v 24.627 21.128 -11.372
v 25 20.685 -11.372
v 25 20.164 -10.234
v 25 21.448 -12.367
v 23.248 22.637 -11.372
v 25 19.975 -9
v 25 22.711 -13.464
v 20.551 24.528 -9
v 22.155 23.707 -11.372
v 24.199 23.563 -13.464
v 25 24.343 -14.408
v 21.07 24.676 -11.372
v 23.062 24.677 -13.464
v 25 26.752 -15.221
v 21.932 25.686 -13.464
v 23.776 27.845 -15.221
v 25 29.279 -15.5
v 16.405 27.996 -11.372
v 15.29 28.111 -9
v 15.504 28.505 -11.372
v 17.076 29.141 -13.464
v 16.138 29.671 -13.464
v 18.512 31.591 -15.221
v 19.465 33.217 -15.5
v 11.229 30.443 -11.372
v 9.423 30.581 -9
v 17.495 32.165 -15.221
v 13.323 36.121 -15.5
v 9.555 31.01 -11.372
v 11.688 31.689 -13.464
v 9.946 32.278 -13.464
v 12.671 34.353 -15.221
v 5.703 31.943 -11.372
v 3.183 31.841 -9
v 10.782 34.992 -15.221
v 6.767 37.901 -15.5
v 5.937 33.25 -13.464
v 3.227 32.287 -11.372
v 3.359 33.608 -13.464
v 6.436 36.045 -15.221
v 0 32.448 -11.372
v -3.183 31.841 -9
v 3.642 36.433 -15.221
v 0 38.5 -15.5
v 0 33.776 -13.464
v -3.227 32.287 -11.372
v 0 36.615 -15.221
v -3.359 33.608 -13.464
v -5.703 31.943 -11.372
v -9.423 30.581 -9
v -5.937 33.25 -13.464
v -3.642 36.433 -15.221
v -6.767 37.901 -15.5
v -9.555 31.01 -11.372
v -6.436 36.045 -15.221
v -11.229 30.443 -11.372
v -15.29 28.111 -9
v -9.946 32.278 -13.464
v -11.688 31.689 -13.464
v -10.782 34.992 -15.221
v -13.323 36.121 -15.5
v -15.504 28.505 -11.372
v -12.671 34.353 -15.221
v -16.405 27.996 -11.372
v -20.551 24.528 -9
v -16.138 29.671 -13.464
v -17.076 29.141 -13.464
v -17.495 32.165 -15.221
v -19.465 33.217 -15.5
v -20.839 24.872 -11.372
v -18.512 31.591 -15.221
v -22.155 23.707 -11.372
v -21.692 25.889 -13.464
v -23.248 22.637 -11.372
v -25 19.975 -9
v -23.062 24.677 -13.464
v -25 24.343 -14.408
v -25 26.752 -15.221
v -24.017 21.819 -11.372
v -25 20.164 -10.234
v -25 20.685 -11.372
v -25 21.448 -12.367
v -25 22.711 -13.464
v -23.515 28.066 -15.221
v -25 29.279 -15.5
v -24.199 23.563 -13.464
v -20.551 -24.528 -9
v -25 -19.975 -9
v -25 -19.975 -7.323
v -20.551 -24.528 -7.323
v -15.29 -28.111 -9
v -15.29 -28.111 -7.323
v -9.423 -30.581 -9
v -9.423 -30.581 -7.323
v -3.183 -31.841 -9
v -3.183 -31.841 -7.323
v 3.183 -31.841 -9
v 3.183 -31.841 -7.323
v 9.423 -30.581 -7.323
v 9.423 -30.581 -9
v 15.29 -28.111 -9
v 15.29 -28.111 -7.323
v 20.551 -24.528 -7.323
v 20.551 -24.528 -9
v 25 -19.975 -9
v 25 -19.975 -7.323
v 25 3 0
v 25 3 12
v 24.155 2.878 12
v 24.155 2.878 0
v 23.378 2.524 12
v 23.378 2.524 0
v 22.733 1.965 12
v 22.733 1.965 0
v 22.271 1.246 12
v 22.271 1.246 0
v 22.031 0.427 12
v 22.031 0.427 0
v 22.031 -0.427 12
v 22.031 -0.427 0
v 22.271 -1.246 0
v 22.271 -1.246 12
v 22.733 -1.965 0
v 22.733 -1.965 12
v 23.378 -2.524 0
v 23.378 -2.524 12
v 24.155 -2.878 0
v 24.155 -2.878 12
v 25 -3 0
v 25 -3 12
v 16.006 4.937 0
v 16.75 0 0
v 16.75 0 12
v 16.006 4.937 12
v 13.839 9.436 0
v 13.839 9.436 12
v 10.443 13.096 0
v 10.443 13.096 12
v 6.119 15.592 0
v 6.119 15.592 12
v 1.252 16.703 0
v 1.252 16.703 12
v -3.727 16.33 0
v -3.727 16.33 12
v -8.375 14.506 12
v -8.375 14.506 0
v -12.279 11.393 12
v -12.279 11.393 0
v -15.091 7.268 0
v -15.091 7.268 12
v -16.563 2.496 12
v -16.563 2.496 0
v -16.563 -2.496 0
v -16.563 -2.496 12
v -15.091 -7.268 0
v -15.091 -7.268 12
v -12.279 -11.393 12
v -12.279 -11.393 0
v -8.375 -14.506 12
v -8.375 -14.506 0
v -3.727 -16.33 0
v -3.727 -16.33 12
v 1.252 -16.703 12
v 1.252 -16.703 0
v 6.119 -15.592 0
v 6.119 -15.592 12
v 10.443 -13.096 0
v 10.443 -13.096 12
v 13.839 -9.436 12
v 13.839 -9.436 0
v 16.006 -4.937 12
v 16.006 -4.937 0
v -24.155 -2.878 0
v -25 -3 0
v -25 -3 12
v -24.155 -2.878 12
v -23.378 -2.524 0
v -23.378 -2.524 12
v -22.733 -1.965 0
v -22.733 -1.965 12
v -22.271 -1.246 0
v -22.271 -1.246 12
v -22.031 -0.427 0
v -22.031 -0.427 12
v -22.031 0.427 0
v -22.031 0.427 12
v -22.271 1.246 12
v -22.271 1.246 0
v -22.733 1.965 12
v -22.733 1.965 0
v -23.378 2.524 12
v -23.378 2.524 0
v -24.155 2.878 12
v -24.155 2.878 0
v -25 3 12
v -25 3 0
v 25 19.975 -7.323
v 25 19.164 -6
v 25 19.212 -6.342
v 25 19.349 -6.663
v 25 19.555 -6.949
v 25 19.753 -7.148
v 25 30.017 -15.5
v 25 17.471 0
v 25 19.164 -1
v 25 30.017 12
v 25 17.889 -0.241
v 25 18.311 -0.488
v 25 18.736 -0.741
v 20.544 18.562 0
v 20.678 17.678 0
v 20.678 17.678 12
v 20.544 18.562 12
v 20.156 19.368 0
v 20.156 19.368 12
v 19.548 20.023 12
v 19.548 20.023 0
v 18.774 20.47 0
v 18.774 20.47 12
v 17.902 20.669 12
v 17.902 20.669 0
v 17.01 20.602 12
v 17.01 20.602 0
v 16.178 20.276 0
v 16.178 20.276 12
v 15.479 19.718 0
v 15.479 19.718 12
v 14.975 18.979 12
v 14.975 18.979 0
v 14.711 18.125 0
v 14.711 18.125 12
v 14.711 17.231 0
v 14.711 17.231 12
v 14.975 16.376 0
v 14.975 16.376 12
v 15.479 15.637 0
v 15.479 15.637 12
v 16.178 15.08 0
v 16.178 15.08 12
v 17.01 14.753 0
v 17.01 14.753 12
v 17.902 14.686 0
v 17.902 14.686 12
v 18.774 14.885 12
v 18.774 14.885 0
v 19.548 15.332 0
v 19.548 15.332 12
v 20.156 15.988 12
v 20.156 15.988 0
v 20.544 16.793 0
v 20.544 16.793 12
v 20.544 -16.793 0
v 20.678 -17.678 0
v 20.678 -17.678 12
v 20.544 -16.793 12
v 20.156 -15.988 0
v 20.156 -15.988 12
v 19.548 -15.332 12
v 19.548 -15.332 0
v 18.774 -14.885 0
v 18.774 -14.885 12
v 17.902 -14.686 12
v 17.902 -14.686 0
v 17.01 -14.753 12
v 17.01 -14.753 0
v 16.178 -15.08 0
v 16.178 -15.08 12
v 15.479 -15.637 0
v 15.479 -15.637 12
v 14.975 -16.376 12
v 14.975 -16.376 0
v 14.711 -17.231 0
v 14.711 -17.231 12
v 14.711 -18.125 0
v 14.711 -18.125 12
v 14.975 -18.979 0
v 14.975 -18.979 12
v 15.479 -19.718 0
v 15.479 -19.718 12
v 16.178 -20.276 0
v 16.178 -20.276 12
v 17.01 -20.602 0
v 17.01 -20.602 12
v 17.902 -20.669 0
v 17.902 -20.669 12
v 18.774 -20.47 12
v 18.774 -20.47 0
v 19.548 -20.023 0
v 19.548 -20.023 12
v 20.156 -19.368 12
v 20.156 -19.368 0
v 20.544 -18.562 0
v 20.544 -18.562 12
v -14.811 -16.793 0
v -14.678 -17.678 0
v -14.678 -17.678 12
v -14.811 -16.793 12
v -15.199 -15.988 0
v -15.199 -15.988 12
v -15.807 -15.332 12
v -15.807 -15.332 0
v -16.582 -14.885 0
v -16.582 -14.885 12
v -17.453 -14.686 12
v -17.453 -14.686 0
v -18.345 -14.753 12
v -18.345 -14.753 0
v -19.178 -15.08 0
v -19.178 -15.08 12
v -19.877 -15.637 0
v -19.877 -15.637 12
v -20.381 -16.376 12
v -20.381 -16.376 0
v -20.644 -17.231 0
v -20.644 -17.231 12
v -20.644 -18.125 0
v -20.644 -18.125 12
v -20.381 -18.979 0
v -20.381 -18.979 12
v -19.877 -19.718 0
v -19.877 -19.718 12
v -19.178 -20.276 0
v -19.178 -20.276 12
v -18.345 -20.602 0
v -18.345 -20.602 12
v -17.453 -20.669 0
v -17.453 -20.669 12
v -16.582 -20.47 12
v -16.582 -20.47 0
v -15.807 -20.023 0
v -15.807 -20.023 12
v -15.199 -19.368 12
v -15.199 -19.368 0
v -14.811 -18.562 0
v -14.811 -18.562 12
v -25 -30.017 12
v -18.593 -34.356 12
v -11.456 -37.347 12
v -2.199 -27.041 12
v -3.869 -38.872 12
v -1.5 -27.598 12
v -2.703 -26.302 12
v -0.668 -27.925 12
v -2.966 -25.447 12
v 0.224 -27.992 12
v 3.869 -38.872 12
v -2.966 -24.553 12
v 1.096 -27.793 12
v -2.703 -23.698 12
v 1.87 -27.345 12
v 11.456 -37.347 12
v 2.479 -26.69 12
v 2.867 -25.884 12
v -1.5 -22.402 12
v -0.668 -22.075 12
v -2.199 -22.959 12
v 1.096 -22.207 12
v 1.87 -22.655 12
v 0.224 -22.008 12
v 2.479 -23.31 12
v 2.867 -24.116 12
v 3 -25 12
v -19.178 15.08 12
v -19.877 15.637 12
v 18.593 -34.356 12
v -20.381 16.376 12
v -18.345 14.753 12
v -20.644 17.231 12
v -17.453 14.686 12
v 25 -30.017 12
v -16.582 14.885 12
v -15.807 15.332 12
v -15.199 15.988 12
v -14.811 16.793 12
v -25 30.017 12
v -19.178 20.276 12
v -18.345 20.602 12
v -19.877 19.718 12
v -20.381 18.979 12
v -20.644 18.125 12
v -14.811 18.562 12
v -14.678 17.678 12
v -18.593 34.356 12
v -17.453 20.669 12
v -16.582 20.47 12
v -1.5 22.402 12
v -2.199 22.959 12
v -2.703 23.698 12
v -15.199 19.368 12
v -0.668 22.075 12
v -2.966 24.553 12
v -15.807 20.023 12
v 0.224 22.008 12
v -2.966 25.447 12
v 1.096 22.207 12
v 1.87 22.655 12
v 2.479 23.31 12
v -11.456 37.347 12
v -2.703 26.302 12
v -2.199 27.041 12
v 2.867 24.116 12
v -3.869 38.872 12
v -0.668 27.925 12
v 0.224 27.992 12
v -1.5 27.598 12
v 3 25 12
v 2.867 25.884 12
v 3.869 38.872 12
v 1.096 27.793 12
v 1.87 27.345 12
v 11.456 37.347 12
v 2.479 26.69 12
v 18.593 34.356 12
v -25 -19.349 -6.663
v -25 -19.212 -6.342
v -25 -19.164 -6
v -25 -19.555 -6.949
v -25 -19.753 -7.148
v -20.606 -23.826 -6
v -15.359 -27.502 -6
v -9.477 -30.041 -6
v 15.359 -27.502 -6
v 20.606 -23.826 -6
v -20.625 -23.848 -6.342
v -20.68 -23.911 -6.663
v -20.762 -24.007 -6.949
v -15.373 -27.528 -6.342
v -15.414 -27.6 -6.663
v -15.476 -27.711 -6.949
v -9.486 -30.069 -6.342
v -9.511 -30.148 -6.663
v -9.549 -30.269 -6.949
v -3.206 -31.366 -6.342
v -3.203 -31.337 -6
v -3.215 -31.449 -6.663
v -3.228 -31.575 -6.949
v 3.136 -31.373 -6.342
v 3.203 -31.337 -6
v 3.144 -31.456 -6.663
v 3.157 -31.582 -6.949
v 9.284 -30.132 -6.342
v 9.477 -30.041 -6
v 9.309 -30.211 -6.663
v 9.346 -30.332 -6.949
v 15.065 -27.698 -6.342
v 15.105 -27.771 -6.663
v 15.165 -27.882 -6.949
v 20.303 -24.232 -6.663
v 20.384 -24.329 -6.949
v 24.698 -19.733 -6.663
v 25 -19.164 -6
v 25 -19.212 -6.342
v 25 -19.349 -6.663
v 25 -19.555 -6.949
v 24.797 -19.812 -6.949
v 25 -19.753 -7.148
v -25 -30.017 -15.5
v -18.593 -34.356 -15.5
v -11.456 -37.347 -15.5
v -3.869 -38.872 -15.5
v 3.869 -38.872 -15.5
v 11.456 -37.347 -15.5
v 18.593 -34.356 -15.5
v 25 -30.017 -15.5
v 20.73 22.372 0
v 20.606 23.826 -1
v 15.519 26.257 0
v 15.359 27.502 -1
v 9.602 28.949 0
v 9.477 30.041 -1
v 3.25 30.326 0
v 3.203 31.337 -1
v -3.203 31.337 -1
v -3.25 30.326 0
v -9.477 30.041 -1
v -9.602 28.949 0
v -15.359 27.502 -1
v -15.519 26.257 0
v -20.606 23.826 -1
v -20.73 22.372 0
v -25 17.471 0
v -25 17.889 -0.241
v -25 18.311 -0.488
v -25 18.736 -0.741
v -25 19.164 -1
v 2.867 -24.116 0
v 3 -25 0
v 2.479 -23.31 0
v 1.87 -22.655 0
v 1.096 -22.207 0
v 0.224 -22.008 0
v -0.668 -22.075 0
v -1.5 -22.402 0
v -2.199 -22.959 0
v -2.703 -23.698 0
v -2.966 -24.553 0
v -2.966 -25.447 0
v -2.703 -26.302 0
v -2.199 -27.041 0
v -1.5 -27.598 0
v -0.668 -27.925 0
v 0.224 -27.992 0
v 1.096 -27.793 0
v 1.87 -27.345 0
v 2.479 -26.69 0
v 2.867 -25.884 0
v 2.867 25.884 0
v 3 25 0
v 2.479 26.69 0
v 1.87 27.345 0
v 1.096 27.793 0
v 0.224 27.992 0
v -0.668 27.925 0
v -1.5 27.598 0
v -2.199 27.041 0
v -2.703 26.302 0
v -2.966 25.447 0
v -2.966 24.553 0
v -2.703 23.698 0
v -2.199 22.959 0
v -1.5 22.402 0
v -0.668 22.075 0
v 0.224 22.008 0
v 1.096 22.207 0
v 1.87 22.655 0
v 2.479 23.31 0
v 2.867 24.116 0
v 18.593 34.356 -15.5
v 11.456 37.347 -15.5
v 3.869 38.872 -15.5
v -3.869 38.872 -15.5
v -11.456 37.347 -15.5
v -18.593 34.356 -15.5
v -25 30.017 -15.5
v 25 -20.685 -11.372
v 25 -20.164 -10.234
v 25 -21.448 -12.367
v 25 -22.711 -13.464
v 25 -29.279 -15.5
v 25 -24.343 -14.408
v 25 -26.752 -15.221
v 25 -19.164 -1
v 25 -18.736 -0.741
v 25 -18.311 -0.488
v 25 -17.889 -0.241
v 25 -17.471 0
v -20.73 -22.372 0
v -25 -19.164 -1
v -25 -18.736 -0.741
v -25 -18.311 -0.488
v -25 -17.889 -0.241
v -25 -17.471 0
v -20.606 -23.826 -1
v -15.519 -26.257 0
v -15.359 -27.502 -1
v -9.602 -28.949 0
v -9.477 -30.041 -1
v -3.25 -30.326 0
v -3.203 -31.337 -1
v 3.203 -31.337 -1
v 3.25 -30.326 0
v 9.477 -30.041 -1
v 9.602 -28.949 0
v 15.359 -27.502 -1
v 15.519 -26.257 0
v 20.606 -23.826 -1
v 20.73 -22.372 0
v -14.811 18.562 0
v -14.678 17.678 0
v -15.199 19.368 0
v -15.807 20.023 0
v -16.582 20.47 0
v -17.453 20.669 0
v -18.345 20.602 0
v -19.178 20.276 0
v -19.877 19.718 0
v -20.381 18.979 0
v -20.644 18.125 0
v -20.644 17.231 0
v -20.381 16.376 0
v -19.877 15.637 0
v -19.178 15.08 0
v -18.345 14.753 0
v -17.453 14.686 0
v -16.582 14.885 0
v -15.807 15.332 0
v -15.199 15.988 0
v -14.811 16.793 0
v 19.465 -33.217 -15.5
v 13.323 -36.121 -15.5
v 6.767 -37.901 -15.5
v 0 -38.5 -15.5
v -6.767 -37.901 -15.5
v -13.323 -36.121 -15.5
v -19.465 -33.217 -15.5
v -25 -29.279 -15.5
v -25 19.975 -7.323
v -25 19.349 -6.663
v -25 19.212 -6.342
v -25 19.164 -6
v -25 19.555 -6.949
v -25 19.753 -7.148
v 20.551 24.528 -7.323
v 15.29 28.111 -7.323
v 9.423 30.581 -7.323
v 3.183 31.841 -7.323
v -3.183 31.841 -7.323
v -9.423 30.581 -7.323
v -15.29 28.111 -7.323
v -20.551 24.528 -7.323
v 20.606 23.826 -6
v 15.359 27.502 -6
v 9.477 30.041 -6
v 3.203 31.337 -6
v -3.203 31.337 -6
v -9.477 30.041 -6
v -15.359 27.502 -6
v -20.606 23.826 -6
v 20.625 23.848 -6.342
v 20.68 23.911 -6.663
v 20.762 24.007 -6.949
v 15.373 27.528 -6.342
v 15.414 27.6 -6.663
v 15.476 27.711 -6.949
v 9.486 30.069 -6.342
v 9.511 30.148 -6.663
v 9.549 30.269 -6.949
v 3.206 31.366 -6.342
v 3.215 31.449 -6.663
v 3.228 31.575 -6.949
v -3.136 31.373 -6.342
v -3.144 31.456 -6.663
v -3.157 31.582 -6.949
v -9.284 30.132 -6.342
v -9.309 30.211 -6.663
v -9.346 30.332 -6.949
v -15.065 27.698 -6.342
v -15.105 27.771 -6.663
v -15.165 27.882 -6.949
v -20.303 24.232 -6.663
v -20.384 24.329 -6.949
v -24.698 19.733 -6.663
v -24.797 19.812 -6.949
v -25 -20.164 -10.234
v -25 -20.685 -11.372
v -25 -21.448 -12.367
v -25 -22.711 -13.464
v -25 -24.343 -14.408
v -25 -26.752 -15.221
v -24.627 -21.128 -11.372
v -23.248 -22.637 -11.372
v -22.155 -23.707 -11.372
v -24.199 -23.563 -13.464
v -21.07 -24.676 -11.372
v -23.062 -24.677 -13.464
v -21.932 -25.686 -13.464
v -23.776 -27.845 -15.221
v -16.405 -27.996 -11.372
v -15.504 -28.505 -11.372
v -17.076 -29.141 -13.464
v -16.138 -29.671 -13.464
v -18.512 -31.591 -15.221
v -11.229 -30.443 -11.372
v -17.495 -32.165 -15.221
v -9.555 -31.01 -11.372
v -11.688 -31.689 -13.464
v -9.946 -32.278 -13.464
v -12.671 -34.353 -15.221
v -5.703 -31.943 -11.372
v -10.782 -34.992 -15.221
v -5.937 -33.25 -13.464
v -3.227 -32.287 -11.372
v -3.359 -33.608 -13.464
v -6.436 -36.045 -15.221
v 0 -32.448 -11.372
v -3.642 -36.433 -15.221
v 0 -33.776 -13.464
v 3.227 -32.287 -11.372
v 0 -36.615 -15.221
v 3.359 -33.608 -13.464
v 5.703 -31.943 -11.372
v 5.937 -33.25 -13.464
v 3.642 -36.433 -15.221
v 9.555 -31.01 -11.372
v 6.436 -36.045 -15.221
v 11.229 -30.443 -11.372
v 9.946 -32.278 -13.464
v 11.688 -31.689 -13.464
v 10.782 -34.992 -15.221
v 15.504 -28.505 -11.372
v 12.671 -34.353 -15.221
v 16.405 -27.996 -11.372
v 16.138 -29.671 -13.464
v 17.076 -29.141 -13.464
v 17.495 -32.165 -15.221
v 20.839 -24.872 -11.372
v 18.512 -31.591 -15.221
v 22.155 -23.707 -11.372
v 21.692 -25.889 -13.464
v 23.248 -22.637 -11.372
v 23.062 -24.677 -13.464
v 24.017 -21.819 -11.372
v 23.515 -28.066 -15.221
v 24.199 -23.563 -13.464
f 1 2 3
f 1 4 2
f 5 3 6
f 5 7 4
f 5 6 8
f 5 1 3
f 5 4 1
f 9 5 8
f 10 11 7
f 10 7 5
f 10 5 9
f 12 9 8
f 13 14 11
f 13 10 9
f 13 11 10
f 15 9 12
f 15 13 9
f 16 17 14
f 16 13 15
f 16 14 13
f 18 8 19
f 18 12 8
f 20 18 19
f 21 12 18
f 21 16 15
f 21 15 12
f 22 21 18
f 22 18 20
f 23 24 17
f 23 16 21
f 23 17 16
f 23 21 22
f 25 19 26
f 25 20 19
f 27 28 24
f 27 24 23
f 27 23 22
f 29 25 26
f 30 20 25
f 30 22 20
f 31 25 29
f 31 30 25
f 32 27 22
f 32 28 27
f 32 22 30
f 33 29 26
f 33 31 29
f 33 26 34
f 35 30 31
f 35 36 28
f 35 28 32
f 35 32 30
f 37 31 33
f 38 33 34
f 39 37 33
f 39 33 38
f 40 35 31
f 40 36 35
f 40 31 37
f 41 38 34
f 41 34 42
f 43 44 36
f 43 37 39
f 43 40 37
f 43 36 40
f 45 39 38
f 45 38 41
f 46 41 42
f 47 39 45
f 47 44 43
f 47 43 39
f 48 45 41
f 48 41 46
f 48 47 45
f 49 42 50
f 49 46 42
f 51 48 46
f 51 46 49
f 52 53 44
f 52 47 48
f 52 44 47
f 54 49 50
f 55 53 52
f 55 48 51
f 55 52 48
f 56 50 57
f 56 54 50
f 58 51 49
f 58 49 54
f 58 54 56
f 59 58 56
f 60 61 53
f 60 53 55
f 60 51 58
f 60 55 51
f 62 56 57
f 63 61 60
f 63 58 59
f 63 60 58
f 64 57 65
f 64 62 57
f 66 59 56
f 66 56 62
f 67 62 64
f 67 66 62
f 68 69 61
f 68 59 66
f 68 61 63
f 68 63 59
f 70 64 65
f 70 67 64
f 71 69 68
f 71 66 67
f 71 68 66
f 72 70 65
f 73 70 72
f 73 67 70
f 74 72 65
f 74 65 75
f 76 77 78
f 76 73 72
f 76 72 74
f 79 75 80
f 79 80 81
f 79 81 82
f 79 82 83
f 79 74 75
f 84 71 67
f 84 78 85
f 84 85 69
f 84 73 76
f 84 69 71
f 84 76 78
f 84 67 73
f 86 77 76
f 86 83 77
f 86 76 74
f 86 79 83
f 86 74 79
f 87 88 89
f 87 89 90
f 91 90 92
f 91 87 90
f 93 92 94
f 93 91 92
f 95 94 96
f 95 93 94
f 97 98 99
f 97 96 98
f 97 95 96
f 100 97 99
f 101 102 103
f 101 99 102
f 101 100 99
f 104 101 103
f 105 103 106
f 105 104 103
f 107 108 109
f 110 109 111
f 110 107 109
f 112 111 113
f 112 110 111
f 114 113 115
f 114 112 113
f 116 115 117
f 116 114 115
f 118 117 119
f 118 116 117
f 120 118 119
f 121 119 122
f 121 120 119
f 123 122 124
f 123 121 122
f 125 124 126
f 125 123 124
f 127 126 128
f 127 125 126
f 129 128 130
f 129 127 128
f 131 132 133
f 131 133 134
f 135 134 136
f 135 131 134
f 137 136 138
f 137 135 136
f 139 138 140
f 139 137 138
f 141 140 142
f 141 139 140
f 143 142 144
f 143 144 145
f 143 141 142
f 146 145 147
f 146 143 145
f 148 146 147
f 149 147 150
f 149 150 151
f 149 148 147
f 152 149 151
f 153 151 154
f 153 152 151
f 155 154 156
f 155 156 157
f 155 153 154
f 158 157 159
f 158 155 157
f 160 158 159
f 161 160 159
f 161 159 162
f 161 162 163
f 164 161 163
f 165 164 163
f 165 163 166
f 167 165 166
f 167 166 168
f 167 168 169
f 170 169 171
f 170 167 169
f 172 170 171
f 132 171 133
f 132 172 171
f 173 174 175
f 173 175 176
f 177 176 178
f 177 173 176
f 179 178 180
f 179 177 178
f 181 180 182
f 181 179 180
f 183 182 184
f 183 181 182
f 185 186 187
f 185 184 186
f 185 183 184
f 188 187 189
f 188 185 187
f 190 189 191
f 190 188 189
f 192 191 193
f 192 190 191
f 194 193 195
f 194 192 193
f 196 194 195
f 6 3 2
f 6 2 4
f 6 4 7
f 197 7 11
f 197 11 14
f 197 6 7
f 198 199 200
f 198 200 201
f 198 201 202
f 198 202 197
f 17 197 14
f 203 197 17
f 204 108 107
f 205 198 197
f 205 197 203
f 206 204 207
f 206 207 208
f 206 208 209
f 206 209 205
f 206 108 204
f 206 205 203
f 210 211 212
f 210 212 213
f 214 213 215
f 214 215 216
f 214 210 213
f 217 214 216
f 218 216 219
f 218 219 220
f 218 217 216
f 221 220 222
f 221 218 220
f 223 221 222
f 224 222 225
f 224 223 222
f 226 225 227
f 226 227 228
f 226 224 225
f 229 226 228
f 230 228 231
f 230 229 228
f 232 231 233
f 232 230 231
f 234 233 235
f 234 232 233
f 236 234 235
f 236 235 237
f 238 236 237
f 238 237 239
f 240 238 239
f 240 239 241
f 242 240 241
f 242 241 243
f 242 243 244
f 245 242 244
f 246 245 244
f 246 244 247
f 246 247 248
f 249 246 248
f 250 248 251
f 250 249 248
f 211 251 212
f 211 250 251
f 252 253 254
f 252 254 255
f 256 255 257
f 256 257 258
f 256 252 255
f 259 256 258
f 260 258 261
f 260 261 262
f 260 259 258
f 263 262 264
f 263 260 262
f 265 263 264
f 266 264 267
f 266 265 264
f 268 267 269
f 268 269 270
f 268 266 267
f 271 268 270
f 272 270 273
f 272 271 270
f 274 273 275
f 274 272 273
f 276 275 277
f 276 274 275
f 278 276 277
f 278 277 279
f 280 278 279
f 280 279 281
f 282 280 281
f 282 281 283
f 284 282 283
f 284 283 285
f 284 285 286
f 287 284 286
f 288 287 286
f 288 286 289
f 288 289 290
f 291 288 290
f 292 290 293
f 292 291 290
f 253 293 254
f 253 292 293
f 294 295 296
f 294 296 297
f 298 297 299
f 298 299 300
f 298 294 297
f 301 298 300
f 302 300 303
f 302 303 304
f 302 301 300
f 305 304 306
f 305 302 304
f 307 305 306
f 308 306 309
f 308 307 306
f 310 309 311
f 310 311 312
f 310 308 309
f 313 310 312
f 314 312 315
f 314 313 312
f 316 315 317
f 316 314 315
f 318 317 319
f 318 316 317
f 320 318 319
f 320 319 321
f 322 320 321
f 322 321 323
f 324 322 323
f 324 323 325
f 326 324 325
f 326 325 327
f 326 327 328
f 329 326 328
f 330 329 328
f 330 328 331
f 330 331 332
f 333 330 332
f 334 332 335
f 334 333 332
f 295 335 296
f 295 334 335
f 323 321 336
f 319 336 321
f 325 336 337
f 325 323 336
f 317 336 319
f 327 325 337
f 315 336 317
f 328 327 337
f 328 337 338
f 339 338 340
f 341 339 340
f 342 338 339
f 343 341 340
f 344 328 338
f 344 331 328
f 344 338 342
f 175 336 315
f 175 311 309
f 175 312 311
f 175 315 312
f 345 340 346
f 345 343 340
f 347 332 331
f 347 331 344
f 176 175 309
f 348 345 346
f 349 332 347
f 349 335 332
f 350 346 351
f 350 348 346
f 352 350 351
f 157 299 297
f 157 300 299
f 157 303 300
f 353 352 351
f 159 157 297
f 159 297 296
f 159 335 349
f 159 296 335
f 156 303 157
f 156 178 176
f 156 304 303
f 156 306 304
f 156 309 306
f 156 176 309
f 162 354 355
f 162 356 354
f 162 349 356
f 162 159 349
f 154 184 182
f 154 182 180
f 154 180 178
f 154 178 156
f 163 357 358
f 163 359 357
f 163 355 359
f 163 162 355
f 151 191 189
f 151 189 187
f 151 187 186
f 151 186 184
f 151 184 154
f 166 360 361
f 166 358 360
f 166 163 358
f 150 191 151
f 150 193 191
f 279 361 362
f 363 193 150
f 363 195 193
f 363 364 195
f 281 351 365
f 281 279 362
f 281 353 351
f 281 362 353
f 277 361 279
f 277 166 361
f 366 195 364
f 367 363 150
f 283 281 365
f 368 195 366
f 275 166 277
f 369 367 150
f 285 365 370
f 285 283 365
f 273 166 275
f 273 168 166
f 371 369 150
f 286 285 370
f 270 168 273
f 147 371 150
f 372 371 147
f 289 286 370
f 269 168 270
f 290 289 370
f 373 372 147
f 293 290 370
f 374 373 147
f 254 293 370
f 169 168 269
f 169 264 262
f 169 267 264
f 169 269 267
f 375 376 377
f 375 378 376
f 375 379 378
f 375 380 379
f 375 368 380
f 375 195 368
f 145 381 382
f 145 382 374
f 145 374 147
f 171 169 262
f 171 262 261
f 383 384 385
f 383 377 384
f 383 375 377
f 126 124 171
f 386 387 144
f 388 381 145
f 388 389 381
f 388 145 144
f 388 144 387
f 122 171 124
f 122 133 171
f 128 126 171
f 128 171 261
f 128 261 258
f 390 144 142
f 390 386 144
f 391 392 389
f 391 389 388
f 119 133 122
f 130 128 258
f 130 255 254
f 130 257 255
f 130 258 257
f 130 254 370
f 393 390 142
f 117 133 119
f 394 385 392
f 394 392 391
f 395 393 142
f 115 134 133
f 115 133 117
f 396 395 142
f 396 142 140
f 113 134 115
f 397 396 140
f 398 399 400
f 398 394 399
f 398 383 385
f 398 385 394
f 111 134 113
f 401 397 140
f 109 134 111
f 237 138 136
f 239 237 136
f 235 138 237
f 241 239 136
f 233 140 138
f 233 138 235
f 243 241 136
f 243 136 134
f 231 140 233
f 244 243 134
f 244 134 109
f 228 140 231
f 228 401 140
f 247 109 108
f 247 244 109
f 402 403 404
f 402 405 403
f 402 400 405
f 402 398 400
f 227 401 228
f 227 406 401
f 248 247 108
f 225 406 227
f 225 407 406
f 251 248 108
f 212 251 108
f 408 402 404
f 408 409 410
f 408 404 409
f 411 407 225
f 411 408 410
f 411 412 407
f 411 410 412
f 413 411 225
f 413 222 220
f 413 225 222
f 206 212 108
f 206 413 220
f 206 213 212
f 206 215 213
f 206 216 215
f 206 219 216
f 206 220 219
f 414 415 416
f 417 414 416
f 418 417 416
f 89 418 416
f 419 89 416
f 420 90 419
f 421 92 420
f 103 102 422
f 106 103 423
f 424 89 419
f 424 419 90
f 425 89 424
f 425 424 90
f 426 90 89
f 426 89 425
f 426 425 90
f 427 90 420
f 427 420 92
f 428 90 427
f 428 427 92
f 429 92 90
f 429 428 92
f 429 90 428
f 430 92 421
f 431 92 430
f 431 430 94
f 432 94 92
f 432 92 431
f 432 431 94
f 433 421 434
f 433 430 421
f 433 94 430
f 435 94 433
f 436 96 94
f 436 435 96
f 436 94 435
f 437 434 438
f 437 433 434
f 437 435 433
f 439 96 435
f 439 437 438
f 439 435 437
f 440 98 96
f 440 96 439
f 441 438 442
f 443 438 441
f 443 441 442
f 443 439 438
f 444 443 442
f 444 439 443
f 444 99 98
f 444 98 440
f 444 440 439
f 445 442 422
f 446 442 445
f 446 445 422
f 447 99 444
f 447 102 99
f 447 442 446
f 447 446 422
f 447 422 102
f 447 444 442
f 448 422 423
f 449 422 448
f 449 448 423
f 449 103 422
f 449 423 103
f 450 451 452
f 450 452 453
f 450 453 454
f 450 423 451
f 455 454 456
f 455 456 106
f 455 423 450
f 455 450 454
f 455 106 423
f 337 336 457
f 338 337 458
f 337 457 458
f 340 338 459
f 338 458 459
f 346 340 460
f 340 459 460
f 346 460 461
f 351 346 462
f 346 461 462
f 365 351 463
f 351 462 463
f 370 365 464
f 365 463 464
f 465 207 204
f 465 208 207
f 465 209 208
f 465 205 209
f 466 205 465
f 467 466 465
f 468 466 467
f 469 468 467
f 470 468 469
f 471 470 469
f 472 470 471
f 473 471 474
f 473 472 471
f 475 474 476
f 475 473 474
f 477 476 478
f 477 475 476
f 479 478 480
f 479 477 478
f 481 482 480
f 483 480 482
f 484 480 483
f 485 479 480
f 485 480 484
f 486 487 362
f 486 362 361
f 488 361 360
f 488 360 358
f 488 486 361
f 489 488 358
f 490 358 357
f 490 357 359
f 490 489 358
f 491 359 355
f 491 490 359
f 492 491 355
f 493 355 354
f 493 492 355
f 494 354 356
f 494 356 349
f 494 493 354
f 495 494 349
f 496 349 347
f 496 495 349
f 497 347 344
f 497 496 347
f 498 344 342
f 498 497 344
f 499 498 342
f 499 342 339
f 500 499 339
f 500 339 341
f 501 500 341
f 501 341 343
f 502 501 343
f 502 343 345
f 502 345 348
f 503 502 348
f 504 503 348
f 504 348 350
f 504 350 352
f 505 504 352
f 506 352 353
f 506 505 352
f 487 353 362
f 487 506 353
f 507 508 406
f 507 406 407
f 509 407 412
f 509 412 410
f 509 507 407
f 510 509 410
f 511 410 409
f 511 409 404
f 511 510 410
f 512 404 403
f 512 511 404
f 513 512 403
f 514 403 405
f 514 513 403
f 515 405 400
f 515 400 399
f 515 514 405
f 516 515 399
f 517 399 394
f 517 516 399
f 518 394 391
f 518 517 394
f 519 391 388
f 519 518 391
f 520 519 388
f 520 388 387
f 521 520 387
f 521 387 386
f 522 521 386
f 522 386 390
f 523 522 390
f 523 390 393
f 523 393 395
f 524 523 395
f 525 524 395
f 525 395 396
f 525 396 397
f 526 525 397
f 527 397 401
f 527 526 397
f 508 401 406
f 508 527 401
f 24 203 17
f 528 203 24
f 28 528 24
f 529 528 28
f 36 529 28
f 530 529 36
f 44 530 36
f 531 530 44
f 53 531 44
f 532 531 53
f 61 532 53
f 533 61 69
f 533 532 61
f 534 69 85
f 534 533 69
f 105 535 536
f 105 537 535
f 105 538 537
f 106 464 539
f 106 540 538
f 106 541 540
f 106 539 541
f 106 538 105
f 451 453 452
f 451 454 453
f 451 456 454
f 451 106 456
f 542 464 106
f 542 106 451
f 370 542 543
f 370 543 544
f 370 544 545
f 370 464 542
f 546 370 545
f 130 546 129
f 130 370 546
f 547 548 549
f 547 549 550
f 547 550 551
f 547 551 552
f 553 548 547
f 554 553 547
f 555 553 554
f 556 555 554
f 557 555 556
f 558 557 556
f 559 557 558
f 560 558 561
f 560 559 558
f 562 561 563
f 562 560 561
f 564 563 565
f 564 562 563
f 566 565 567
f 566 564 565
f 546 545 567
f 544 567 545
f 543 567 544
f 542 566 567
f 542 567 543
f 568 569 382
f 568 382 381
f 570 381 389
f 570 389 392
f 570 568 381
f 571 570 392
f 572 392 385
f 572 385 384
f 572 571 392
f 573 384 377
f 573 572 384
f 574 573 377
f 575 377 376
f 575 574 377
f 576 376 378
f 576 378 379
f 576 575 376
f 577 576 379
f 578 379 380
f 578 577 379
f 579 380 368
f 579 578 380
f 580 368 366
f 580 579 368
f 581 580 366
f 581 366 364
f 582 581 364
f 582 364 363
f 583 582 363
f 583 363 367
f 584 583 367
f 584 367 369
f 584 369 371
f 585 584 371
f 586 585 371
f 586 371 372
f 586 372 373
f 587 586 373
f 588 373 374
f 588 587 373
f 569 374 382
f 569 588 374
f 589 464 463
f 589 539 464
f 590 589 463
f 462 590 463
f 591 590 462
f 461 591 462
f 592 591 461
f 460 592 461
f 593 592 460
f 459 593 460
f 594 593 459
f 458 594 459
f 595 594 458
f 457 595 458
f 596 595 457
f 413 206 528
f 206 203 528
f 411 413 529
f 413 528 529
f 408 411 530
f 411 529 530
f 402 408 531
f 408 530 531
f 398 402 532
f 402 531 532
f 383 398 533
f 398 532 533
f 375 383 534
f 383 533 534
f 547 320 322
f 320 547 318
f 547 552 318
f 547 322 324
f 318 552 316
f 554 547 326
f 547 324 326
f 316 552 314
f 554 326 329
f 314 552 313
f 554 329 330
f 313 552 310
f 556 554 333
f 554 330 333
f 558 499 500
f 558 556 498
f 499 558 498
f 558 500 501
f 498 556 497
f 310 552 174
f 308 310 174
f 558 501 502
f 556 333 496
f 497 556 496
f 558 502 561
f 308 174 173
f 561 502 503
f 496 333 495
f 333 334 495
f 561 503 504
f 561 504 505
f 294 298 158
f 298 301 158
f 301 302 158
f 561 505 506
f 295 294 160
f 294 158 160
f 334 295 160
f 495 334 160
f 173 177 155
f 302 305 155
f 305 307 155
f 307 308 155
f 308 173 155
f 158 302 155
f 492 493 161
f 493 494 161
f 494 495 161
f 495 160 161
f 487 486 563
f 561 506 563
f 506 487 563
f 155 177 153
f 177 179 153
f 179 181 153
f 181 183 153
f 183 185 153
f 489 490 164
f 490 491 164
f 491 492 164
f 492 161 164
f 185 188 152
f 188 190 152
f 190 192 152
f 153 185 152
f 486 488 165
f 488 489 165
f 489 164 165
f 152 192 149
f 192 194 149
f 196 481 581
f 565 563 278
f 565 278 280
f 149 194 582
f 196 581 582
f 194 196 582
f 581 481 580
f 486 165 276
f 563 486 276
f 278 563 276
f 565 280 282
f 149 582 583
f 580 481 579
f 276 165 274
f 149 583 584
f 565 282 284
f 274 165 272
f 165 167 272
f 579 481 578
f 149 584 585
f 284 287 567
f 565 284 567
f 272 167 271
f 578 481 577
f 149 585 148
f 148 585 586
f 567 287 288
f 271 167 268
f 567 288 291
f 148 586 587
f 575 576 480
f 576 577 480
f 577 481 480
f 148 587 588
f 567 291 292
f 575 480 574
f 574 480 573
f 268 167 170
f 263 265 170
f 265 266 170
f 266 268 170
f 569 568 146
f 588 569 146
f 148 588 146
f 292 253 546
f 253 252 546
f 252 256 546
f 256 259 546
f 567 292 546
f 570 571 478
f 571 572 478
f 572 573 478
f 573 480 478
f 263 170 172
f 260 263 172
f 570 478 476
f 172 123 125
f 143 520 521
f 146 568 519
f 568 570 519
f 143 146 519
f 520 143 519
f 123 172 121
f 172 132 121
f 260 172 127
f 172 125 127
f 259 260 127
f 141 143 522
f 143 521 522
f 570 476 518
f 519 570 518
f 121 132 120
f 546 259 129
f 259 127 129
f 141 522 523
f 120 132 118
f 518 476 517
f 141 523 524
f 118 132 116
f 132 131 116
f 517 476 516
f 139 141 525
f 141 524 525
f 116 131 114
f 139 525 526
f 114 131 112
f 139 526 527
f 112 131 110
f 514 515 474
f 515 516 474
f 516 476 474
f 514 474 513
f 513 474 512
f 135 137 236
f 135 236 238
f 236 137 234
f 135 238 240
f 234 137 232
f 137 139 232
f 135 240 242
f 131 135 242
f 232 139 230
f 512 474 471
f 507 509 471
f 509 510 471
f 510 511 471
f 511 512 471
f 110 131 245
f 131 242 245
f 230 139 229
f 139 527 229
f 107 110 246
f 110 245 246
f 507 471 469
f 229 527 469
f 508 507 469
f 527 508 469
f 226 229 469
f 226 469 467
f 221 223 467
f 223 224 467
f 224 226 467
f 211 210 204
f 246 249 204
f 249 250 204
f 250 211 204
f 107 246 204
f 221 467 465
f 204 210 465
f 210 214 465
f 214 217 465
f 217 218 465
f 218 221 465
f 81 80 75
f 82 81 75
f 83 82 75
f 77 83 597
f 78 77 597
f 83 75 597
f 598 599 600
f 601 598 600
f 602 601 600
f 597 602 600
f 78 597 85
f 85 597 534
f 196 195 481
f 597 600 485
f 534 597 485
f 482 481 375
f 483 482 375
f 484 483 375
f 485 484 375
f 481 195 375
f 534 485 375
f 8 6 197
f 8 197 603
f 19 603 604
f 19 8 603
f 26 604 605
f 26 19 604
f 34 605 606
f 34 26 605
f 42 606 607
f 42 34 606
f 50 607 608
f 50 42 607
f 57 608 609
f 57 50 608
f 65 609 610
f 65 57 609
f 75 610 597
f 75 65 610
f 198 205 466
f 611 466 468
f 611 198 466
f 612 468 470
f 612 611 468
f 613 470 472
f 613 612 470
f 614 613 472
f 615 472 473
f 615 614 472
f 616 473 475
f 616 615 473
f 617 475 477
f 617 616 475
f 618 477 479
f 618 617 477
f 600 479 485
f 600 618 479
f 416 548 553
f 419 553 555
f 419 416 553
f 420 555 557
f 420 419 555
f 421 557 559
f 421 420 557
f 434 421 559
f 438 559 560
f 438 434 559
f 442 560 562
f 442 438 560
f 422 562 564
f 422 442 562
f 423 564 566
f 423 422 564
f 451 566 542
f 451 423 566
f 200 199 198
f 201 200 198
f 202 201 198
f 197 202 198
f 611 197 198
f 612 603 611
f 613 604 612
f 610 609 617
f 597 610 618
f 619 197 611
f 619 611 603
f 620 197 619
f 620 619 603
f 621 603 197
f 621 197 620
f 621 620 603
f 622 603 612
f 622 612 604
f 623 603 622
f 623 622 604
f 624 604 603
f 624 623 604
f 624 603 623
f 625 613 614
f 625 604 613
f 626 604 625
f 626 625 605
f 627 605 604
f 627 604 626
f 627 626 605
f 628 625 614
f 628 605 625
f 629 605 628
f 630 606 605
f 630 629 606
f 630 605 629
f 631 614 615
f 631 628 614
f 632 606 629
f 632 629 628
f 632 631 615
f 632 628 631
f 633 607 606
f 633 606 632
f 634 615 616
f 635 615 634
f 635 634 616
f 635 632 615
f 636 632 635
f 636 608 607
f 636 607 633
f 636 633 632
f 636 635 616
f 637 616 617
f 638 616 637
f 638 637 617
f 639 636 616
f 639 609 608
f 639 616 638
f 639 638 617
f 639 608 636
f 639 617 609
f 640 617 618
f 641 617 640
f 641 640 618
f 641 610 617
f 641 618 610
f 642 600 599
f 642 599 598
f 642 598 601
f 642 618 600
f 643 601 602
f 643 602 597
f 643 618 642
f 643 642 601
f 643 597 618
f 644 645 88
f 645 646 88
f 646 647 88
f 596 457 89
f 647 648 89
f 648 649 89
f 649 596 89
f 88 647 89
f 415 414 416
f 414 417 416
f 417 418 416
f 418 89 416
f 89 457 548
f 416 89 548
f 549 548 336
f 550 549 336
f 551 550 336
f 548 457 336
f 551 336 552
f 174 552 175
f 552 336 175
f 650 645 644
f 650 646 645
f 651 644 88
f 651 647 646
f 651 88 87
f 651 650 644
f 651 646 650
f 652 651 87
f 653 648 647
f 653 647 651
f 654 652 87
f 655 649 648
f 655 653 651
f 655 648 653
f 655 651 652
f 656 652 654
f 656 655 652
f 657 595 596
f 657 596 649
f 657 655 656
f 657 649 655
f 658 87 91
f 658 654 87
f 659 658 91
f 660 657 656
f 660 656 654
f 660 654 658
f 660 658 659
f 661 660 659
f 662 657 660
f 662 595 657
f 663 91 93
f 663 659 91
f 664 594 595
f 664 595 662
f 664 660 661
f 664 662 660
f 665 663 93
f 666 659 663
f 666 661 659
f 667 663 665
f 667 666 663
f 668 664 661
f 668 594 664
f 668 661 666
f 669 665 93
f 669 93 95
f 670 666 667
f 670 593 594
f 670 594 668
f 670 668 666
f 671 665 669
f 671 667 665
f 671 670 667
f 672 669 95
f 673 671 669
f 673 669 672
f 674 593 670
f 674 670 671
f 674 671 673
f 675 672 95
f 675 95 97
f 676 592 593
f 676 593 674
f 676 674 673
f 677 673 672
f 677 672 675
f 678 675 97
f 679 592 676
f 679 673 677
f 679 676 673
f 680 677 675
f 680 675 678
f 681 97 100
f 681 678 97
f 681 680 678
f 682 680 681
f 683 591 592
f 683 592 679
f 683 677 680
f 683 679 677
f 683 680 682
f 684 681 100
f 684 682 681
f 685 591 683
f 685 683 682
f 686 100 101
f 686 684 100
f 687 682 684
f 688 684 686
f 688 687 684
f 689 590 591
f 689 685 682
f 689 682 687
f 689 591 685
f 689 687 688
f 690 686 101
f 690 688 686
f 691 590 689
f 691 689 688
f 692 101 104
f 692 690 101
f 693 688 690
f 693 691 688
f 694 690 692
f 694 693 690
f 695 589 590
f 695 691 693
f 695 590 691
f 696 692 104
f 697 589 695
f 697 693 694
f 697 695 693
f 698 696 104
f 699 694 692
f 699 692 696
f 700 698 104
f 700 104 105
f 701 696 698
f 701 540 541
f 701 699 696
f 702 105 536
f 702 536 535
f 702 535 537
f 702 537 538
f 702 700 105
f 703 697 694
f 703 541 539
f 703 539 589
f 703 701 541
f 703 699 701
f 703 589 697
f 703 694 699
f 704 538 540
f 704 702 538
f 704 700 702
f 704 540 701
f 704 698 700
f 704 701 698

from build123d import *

# Parameters (mm, degrees)
BOSS_EXTRUDE1_OUTLINE_R     = 39.0639683
BOSS_EXTRUDE1_OUTLINE_R_2   = 3
BOSS_EXTRUDE1_OUTLINE_R_3   = 16.75
BOSS_EXTRUDE1_DEPTH         = 12
BOSS_EXTRUDE1_START         = -9.0000001
BOSS_EXTRUDE1_2_OUTLINE_R   = 39.0639683
BOSS_EXTRUDE1_2_OUTLINE_R_2 = 32
BOSS_EXTRUDE1_2_DEPTH       = 9.0000001
BOSS_EXTRUDE1_START_2       = -6.0000001
BOSS_EXTRUDE1_3_OUTLINE_R   = 32
BOSS_EXTRUDE1_3_OUTLINE_R_2 = 31.5
BOSS_EXTRUDE1_3_DEPTH       = 6.0000001
CUT_EXTRUDE1_REACH          = 63.711


with BuildPart() as part:
    # Boss-Extrude1: read off the stored shape, not the designer's step
    # Boss-Extrude1 outline → Boss-Extrude1 (new body)
    with BuildSketch(Plane.XY):
        Circle(BOSS_EXTRUDE1_OUTLINE_R)
        with Locations((0, 25)):
            Circle(BOSS_EXTRUDE1_OUTLINE_R_2, mode=Mode.SUBTRACT)
        with Locations((-17.67766953, -17.67766953)):
            Circle(BOSS_EXTRUDE1_OUTLINE_R_2, mode=Mode.SUBTRACT)
        with Locations((0, -25)):
            Circle(BOSS_EXTRUDE1_OUTLINE_R_2, mode=Mode.SUBTRACT)
        with Locations((17.67766953, -17.67766953)):
            Circle(BOSS_EXTRUDE1_OUTLINE_R_2, mode=Mode.SUBTRACT)
        with Locations((-25, 0)):
            Circle(BOSS_EXTRUDE1_OUTLINE_R_2, mode=Mode.SUBTRACT)
        with Locations((-17.67766953, 17.67766953)):
            Circle(BOSS_EXTRUDE1_OUTLINE_R_2, mode=Mode.SUBTRACT)
        Circle(BOSS_EXTRUDE1_OUTLINE_R_3, mode=Mode.SUBTRACT)
        with Locations((17.67766953, 17.67766953)):
            Circle(BOSS_EXTRUDE1_OUTLINE_R_2, mode=Mode.SUBTRACT)
        with Locations((25, 0)):
            Circle(BOSS_EXTRUDE1_OUTLINE_R_2, mode=Mode.SUBTRACT)
    extrude(amount=BOSS_EXTRUDE1_DEPTH)



with BuildPart() as body_2:
    # Boss-Extrude1 2 outline → Boss-Extrude1 2 (new body)
    with BuildSketch(Plane.XY.offset(BOSS_EXTRUDE1_START)):
        Circle(BOSS_EXTRUDE1_2_OUTLINE_R)
        Circle(BOSS_EXTRUDE1_2_OUTLINE_R_2, mode=Mode.SUBTRACT)
    extrude(amount=BOSS_EXTRUDE1_2_DEPTH)


with BuildPart() as body_3:
    # Boss-Extrude1 3 outline → Boss-Extrude1 3 (new body)
    with BuildSketch(Plane.XY.offset(BOSS_EXTRUDE1_START_2)):
        Circle(BOSS_EXTRUDE1_3_OUTLINE_R)
        Circle(BOSS_EXTRUDE1_3_OUTLINE_R_2, mode=Mode.SUBTRACT)
    extrude(amount=BOSS_EXTRUDE1_3_DEPTH)


with BuildPart() as part_1:
    add(part.part)

    add(body_2.part)  # Boss-Extrude1 4 merges body 2

    add(body_3.part)  # Boss-Extrude1 4 merges body 3
    # Boss-Extrude1 4 outline → Boss-Extrude1 4 (revolve)
    with BuildSketch(Plane.XZ):
        Polygon((31.499999999, -1.000000001), (31.499999999, 0), (30.5, 0), align=None)
        with BuildLine():
            Line((32, -7.322875656), (32, -6.0000001))
            Line((32, -6.0000001), (31.5, -6))
            ThreePointArc((31.5, -6), (31.629171307, -6.707106781), (32, -7.322875656))
        make_face()
        with BuildLine():
            Line((39.0639683, -15.5), (39.0639683, -9.0000001))
            Line((39.0639683, -9.0000001), (32, -9))
            ThreePointArc((32, -9), (33.903805922, -13.596194078), (38.5, -15.5))
            Line((38.5, -15.5), (39.0639683, -15.5))
        make_face()
    revolve(axis=Axis((0, 0, 0), (0, 0, 1)))

    # Sketch2 → Cut-Extrude1 (cut, up to next)
    with BuildSketch(Plane.XY.offset(12), mode=Mode.PRIVATE) as cut_extrude1_sk1:
        with BuildLine():
            Line((-25, -30.016555754), (-25, 30.016555754))
            ThreePointArc((-25, 30.016555754), (-39.0639683, 0), (-25, -30.016555754))
        make_face()
    cut_extrude1_tool1 = extrude(cut_extrude1_sk1.sketch, amount=-CUT_EXTRUDE1_REACH, mode=Mode.PRIVATE) & part_1.part
    # Sketch2 → Cut-Extrude1 (cut, up to next)
    with BuildSketch(Plane.XY.offset(12), mode=Mode.PRIVATE) as cut_extrude1_sk2:
        with BuildLine():
            Line((25, -30.016555754), (25, 30.016555754))
            ThreePointArc((25, 30.016555754), (39.0639683, 0), (25, -30.016555754))
        make_face()
    cut_extrude1_tool2 = extrude(cut_extrude1_sk2.sketch, amount=-CUT_EXTRUDE1_REACH, mode=Mode.PRIVATE) & part_1.part
    add(cut_extrude1_tool1.solids().sort_by_distance((-30.722563, 0, 12))[0], mode=Mode.SUBTRACT)
    add(cut_extrude1_tool2.solids().sort_by_distance((30.722563, 0, 12))[0], mode=Mode.SUBTRACT)


solid = part_1.part
